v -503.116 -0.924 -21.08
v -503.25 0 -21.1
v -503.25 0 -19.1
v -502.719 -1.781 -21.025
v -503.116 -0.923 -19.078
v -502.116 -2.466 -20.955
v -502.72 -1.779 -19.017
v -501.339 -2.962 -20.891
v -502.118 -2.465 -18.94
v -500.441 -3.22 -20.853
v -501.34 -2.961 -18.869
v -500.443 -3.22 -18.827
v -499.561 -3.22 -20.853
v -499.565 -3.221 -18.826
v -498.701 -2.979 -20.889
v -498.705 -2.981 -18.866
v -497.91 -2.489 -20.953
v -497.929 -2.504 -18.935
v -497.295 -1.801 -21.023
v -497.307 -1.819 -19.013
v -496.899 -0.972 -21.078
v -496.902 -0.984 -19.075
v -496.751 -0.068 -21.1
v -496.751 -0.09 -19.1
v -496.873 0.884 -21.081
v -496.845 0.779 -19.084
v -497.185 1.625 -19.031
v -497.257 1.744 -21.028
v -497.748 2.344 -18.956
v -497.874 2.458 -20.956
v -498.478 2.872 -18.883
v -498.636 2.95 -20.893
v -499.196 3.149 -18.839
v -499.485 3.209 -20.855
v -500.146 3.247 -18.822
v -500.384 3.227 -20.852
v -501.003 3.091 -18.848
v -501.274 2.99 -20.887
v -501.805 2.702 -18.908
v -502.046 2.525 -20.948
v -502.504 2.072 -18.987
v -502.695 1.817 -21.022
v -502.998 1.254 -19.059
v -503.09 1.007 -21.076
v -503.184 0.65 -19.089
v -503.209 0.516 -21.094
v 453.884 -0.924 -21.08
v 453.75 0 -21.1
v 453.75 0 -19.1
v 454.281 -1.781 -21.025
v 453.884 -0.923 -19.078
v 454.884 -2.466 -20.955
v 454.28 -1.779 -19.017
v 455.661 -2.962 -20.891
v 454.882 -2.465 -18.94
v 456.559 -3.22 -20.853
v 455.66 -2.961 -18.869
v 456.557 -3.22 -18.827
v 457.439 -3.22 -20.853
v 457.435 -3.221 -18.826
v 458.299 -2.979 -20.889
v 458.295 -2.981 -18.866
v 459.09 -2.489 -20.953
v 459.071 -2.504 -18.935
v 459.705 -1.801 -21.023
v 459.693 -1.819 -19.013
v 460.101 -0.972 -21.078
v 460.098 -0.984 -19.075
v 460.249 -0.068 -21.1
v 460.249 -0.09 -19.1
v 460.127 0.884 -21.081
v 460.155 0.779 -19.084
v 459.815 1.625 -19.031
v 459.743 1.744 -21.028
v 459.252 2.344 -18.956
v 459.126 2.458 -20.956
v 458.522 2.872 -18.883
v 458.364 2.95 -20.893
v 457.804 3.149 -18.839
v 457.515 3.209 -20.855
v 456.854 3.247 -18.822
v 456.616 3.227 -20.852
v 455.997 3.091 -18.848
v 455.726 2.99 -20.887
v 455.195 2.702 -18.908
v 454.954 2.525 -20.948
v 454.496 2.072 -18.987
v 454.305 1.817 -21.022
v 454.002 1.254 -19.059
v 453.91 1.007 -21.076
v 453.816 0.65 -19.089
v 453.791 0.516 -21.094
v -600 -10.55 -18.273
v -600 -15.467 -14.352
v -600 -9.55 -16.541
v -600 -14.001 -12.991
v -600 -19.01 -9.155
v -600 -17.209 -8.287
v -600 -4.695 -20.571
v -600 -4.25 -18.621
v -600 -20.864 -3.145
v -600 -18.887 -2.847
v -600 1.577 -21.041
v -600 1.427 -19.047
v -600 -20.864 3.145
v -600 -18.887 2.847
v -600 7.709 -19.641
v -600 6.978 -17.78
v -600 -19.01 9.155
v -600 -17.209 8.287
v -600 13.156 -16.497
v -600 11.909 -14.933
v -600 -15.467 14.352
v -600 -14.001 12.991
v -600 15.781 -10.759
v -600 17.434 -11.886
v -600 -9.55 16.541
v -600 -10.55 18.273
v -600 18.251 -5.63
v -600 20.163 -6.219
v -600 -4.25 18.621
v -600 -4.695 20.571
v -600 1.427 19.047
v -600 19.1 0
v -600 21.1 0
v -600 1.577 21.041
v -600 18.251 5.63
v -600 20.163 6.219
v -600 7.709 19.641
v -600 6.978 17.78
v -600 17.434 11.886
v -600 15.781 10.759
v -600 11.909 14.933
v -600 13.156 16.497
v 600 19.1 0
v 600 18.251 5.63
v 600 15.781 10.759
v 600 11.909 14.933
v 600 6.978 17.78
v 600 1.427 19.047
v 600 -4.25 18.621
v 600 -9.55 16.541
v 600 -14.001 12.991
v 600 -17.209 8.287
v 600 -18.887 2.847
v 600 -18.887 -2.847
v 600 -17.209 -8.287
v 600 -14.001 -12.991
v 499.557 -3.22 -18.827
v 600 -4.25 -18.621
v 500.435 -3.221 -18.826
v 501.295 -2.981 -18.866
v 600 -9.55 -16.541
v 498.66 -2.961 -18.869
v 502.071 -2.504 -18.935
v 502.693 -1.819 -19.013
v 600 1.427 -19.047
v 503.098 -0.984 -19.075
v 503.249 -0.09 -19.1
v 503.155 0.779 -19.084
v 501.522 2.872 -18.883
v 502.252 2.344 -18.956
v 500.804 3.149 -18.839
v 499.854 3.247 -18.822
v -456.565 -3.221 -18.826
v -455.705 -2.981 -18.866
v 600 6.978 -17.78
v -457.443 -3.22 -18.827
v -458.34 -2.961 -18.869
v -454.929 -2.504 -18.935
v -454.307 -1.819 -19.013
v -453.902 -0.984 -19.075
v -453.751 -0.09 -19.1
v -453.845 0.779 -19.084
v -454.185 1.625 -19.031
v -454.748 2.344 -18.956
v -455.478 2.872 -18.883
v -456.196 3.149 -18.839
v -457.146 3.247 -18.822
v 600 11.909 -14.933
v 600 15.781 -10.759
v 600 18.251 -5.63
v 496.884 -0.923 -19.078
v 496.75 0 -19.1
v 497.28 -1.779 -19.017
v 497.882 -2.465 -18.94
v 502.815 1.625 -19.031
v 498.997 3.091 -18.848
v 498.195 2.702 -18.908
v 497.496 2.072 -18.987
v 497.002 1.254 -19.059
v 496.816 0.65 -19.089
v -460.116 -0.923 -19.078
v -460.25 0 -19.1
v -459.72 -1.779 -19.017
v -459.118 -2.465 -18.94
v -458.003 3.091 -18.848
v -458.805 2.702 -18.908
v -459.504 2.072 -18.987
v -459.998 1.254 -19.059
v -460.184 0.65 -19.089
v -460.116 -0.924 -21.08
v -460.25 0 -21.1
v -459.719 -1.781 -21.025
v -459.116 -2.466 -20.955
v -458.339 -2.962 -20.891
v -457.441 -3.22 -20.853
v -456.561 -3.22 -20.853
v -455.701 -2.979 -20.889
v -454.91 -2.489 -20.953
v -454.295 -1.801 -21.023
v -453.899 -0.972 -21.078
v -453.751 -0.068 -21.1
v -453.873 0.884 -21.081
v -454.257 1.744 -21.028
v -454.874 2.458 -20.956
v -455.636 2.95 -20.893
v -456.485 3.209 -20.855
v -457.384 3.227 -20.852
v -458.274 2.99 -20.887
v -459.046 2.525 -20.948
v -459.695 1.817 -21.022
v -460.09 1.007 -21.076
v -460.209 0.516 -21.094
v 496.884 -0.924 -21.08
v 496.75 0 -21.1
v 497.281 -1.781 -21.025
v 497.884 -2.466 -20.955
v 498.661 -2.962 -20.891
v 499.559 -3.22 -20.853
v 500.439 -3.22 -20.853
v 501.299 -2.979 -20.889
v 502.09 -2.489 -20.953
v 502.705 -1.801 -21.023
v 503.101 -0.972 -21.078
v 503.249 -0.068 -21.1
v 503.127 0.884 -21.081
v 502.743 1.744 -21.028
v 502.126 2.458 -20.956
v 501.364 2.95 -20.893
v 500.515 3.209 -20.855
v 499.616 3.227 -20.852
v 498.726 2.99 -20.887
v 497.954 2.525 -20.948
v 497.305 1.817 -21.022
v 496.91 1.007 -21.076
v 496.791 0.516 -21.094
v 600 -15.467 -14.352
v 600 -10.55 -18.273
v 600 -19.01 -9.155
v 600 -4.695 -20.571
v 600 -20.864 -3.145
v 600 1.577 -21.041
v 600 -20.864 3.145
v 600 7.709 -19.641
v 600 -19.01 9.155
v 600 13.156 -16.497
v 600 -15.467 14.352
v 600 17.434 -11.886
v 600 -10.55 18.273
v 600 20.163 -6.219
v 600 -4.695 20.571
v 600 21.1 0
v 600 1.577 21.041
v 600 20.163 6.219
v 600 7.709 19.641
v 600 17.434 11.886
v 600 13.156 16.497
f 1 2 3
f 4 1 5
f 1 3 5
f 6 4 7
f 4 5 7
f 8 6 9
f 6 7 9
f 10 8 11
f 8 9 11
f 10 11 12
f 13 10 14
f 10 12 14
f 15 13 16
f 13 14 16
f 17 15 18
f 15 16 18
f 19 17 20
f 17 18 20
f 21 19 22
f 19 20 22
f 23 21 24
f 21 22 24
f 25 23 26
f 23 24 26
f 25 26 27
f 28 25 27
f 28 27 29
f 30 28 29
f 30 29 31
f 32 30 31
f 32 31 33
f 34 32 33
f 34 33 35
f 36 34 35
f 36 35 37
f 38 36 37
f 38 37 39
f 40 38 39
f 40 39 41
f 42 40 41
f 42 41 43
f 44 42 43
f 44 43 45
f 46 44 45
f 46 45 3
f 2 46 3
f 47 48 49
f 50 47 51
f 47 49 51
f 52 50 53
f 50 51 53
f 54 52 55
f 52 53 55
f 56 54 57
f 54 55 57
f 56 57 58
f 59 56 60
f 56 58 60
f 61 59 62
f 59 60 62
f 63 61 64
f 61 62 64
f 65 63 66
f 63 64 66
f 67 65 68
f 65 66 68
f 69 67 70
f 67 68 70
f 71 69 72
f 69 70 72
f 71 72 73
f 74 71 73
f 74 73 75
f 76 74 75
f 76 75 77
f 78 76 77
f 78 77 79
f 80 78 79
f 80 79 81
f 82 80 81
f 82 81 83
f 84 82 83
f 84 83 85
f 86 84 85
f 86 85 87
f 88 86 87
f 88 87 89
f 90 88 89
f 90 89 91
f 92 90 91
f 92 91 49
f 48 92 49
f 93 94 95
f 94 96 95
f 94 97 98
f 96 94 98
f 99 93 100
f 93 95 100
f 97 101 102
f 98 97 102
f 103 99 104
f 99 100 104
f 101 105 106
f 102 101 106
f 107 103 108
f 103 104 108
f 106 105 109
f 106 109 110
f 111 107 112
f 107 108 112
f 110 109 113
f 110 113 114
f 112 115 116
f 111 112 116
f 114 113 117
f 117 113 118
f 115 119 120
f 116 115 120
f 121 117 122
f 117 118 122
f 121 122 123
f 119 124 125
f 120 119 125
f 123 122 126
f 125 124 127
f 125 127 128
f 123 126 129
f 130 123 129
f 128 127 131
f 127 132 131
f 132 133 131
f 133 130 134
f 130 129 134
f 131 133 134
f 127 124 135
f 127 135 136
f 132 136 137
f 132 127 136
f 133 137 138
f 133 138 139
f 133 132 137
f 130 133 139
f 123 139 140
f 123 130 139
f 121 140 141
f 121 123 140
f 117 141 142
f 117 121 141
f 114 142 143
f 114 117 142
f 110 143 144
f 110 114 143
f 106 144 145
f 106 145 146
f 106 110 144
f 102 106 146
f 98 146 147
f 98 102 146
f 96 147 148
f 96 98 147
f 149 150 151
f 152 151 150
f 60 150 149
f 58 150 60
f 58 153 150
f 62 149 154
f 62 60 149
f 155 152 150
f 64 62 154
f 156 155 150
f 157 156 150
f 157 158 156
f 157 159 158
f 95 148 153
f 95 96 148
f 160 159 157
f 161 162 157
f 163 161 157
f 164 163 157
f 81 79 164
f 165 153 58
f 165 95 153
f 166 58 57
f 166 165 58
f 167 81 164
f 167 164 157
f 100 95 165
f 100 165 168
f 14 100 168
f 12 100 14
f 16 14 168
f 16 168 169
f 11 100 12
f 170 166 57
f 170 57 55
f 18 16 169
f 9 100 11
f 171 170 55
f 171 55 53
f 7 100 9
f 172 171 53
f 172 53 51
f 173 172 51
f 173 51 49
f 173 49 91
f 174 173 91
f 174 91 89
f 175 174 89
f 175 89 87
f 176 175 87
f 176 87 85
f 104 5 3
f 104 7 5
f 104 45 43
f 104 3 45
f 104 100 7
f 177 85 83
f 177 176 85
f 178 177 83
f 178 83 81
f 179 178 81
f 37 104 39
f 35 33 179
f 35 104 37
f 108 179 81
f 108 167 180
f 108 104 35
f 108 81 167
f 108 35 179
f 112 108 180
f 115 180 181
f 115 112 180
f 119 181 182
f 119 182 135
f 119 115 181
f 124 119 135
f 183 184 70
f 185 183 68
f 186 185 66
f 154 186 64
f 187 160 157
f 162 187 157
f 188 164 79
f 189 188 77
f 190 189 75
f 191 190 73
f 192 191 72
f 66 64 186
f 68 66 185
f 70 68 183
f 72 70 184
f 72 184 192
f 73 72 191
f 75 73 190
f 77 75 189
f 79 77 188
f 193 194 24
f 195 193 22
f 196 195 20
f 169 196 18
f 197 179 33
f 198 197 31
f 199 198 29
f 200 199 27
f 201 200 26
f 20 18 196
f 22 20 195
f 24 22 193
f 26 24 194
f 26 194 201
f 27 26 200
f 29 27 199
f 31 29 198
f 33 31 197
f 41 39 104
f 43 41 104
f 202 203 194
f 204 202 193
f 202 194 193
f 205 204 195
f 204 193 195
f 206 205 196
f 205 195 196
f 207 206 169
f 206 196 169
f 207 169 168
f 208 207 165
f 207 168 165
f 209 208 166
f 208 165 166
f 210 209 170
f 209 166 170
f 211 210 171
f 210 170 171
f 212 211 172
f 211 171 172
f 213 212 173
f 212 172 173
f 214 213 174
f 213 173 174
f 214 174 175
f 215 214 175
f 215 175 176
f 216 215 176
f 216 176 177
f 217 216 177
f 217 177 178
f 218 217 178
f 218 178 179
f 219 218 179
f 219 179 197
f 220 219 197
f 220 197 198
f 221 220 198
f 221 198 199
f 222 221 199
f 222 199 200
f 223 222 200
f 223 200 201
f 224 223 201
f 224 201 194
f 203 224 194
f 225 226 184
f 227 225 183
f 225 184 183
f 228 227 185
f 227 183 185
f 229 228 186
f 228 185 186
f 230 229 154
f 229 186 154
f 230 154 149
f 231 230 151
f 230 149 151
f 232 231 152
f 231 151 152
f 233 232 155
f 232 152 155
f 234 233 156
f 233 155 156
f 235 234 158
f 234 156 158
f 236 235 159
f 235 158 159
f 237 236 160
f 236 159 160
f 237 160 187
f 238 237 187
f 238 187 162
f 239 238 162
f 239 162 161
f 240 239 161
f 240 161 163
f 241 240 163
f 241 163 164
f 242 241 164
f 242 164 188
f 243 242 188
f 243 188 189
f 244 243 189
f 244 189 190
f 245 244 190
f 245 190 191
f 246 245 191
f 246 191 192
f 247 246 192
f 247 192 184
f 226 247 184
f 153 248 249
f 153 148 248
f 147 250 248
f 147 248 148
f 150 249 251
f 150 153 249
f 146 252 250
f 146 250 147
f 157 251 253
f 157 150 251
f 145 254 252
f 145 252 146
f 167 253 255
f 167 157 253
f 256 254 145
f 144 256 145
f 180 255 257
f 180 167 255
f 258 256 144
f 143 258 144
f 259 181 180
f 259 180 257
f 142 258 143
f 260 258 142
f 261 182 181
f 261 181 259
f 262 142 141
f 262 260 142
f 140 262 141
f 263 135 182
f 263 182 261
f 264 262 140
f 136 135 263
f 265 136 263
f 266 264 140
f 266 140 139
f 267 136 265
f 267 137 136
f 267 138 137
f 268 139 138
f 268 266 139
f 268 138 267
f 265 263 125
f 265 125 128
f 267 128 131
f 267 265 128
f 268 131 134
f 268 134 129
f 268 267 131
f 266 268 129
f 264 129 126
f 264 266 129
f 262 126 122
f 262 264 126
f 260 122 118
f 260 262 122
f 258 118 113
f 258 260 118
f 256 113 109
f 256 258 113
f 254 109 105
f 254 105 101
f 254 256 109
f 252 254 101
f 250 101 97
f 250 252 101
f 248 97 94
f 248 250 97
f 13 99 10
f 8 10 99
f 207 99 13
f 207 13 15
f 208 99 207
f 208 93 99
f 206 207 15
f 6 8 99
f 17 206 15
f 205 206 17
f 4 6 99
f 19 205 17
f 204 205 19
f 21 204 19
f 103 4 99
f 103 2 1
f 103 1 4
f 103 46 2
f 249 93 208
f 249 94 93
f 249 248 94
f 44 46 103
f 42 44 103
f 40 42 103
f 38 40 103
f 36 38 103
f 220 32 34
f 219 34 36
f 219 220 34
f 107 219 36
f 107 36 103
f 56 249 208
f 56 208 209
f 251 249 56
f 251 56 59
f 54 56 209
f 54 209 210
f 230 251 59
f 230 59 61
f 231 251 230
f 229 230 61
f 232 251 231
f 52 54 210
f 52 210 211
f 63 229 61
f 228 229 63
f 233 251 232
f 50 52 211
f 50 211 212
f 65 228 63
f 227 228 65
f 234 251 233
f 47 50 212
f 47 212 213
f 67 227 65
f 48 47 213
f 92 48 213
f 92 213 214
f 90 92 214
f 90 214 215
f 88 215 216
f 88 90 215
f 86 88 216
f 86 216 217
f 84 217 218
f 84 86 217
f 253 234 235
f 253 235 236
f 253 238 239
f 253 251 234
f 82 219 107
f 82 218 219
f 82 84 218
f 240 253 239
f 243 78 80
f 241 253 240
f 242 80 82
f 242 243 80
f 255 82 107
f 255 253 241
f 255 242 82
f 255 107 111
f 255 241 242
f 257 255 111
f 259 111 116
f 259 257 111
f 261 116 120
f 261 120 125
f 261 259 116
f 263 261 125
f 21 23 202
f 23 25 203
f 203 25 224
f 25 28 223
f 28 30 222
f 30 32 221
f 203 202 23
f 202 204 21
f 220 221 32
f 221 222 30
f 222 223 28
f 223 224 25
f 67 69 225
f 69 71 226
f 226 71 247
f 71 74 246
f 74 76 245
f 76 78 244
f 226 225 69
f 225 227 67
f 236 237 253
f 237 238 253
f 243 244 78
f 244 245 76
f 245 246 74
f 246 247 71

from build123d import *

# Parameters (mm, degrees)
F0_R     = 21.1
F0_R_2   = 19.1
F1_DEPTH = 600
F4_D     = 6.5
F4_DEPTH = 10


with BuildPart() as f1:
    # F0 (on Right) → F1 (new body, symmetric)
    with BuildSketch(Plane.YZ):
        Circle(F0_R)
        Circle(F0_R_2, mode=Mode.SUBTRACT)
    extrude(amount=F1_DEPTH, both=True)

    # F4
    with Locations(Plane(origin=(0, 0, -25), x_dir=(1, 0, 0), z_dir=(0, 0, -1))):
        with Locations((-500, 0), (-457, 0), (457, 0), (500, 0)):
            Hole(F4_D / 2, depth=F4_DEPTH)


solid = f1.part
